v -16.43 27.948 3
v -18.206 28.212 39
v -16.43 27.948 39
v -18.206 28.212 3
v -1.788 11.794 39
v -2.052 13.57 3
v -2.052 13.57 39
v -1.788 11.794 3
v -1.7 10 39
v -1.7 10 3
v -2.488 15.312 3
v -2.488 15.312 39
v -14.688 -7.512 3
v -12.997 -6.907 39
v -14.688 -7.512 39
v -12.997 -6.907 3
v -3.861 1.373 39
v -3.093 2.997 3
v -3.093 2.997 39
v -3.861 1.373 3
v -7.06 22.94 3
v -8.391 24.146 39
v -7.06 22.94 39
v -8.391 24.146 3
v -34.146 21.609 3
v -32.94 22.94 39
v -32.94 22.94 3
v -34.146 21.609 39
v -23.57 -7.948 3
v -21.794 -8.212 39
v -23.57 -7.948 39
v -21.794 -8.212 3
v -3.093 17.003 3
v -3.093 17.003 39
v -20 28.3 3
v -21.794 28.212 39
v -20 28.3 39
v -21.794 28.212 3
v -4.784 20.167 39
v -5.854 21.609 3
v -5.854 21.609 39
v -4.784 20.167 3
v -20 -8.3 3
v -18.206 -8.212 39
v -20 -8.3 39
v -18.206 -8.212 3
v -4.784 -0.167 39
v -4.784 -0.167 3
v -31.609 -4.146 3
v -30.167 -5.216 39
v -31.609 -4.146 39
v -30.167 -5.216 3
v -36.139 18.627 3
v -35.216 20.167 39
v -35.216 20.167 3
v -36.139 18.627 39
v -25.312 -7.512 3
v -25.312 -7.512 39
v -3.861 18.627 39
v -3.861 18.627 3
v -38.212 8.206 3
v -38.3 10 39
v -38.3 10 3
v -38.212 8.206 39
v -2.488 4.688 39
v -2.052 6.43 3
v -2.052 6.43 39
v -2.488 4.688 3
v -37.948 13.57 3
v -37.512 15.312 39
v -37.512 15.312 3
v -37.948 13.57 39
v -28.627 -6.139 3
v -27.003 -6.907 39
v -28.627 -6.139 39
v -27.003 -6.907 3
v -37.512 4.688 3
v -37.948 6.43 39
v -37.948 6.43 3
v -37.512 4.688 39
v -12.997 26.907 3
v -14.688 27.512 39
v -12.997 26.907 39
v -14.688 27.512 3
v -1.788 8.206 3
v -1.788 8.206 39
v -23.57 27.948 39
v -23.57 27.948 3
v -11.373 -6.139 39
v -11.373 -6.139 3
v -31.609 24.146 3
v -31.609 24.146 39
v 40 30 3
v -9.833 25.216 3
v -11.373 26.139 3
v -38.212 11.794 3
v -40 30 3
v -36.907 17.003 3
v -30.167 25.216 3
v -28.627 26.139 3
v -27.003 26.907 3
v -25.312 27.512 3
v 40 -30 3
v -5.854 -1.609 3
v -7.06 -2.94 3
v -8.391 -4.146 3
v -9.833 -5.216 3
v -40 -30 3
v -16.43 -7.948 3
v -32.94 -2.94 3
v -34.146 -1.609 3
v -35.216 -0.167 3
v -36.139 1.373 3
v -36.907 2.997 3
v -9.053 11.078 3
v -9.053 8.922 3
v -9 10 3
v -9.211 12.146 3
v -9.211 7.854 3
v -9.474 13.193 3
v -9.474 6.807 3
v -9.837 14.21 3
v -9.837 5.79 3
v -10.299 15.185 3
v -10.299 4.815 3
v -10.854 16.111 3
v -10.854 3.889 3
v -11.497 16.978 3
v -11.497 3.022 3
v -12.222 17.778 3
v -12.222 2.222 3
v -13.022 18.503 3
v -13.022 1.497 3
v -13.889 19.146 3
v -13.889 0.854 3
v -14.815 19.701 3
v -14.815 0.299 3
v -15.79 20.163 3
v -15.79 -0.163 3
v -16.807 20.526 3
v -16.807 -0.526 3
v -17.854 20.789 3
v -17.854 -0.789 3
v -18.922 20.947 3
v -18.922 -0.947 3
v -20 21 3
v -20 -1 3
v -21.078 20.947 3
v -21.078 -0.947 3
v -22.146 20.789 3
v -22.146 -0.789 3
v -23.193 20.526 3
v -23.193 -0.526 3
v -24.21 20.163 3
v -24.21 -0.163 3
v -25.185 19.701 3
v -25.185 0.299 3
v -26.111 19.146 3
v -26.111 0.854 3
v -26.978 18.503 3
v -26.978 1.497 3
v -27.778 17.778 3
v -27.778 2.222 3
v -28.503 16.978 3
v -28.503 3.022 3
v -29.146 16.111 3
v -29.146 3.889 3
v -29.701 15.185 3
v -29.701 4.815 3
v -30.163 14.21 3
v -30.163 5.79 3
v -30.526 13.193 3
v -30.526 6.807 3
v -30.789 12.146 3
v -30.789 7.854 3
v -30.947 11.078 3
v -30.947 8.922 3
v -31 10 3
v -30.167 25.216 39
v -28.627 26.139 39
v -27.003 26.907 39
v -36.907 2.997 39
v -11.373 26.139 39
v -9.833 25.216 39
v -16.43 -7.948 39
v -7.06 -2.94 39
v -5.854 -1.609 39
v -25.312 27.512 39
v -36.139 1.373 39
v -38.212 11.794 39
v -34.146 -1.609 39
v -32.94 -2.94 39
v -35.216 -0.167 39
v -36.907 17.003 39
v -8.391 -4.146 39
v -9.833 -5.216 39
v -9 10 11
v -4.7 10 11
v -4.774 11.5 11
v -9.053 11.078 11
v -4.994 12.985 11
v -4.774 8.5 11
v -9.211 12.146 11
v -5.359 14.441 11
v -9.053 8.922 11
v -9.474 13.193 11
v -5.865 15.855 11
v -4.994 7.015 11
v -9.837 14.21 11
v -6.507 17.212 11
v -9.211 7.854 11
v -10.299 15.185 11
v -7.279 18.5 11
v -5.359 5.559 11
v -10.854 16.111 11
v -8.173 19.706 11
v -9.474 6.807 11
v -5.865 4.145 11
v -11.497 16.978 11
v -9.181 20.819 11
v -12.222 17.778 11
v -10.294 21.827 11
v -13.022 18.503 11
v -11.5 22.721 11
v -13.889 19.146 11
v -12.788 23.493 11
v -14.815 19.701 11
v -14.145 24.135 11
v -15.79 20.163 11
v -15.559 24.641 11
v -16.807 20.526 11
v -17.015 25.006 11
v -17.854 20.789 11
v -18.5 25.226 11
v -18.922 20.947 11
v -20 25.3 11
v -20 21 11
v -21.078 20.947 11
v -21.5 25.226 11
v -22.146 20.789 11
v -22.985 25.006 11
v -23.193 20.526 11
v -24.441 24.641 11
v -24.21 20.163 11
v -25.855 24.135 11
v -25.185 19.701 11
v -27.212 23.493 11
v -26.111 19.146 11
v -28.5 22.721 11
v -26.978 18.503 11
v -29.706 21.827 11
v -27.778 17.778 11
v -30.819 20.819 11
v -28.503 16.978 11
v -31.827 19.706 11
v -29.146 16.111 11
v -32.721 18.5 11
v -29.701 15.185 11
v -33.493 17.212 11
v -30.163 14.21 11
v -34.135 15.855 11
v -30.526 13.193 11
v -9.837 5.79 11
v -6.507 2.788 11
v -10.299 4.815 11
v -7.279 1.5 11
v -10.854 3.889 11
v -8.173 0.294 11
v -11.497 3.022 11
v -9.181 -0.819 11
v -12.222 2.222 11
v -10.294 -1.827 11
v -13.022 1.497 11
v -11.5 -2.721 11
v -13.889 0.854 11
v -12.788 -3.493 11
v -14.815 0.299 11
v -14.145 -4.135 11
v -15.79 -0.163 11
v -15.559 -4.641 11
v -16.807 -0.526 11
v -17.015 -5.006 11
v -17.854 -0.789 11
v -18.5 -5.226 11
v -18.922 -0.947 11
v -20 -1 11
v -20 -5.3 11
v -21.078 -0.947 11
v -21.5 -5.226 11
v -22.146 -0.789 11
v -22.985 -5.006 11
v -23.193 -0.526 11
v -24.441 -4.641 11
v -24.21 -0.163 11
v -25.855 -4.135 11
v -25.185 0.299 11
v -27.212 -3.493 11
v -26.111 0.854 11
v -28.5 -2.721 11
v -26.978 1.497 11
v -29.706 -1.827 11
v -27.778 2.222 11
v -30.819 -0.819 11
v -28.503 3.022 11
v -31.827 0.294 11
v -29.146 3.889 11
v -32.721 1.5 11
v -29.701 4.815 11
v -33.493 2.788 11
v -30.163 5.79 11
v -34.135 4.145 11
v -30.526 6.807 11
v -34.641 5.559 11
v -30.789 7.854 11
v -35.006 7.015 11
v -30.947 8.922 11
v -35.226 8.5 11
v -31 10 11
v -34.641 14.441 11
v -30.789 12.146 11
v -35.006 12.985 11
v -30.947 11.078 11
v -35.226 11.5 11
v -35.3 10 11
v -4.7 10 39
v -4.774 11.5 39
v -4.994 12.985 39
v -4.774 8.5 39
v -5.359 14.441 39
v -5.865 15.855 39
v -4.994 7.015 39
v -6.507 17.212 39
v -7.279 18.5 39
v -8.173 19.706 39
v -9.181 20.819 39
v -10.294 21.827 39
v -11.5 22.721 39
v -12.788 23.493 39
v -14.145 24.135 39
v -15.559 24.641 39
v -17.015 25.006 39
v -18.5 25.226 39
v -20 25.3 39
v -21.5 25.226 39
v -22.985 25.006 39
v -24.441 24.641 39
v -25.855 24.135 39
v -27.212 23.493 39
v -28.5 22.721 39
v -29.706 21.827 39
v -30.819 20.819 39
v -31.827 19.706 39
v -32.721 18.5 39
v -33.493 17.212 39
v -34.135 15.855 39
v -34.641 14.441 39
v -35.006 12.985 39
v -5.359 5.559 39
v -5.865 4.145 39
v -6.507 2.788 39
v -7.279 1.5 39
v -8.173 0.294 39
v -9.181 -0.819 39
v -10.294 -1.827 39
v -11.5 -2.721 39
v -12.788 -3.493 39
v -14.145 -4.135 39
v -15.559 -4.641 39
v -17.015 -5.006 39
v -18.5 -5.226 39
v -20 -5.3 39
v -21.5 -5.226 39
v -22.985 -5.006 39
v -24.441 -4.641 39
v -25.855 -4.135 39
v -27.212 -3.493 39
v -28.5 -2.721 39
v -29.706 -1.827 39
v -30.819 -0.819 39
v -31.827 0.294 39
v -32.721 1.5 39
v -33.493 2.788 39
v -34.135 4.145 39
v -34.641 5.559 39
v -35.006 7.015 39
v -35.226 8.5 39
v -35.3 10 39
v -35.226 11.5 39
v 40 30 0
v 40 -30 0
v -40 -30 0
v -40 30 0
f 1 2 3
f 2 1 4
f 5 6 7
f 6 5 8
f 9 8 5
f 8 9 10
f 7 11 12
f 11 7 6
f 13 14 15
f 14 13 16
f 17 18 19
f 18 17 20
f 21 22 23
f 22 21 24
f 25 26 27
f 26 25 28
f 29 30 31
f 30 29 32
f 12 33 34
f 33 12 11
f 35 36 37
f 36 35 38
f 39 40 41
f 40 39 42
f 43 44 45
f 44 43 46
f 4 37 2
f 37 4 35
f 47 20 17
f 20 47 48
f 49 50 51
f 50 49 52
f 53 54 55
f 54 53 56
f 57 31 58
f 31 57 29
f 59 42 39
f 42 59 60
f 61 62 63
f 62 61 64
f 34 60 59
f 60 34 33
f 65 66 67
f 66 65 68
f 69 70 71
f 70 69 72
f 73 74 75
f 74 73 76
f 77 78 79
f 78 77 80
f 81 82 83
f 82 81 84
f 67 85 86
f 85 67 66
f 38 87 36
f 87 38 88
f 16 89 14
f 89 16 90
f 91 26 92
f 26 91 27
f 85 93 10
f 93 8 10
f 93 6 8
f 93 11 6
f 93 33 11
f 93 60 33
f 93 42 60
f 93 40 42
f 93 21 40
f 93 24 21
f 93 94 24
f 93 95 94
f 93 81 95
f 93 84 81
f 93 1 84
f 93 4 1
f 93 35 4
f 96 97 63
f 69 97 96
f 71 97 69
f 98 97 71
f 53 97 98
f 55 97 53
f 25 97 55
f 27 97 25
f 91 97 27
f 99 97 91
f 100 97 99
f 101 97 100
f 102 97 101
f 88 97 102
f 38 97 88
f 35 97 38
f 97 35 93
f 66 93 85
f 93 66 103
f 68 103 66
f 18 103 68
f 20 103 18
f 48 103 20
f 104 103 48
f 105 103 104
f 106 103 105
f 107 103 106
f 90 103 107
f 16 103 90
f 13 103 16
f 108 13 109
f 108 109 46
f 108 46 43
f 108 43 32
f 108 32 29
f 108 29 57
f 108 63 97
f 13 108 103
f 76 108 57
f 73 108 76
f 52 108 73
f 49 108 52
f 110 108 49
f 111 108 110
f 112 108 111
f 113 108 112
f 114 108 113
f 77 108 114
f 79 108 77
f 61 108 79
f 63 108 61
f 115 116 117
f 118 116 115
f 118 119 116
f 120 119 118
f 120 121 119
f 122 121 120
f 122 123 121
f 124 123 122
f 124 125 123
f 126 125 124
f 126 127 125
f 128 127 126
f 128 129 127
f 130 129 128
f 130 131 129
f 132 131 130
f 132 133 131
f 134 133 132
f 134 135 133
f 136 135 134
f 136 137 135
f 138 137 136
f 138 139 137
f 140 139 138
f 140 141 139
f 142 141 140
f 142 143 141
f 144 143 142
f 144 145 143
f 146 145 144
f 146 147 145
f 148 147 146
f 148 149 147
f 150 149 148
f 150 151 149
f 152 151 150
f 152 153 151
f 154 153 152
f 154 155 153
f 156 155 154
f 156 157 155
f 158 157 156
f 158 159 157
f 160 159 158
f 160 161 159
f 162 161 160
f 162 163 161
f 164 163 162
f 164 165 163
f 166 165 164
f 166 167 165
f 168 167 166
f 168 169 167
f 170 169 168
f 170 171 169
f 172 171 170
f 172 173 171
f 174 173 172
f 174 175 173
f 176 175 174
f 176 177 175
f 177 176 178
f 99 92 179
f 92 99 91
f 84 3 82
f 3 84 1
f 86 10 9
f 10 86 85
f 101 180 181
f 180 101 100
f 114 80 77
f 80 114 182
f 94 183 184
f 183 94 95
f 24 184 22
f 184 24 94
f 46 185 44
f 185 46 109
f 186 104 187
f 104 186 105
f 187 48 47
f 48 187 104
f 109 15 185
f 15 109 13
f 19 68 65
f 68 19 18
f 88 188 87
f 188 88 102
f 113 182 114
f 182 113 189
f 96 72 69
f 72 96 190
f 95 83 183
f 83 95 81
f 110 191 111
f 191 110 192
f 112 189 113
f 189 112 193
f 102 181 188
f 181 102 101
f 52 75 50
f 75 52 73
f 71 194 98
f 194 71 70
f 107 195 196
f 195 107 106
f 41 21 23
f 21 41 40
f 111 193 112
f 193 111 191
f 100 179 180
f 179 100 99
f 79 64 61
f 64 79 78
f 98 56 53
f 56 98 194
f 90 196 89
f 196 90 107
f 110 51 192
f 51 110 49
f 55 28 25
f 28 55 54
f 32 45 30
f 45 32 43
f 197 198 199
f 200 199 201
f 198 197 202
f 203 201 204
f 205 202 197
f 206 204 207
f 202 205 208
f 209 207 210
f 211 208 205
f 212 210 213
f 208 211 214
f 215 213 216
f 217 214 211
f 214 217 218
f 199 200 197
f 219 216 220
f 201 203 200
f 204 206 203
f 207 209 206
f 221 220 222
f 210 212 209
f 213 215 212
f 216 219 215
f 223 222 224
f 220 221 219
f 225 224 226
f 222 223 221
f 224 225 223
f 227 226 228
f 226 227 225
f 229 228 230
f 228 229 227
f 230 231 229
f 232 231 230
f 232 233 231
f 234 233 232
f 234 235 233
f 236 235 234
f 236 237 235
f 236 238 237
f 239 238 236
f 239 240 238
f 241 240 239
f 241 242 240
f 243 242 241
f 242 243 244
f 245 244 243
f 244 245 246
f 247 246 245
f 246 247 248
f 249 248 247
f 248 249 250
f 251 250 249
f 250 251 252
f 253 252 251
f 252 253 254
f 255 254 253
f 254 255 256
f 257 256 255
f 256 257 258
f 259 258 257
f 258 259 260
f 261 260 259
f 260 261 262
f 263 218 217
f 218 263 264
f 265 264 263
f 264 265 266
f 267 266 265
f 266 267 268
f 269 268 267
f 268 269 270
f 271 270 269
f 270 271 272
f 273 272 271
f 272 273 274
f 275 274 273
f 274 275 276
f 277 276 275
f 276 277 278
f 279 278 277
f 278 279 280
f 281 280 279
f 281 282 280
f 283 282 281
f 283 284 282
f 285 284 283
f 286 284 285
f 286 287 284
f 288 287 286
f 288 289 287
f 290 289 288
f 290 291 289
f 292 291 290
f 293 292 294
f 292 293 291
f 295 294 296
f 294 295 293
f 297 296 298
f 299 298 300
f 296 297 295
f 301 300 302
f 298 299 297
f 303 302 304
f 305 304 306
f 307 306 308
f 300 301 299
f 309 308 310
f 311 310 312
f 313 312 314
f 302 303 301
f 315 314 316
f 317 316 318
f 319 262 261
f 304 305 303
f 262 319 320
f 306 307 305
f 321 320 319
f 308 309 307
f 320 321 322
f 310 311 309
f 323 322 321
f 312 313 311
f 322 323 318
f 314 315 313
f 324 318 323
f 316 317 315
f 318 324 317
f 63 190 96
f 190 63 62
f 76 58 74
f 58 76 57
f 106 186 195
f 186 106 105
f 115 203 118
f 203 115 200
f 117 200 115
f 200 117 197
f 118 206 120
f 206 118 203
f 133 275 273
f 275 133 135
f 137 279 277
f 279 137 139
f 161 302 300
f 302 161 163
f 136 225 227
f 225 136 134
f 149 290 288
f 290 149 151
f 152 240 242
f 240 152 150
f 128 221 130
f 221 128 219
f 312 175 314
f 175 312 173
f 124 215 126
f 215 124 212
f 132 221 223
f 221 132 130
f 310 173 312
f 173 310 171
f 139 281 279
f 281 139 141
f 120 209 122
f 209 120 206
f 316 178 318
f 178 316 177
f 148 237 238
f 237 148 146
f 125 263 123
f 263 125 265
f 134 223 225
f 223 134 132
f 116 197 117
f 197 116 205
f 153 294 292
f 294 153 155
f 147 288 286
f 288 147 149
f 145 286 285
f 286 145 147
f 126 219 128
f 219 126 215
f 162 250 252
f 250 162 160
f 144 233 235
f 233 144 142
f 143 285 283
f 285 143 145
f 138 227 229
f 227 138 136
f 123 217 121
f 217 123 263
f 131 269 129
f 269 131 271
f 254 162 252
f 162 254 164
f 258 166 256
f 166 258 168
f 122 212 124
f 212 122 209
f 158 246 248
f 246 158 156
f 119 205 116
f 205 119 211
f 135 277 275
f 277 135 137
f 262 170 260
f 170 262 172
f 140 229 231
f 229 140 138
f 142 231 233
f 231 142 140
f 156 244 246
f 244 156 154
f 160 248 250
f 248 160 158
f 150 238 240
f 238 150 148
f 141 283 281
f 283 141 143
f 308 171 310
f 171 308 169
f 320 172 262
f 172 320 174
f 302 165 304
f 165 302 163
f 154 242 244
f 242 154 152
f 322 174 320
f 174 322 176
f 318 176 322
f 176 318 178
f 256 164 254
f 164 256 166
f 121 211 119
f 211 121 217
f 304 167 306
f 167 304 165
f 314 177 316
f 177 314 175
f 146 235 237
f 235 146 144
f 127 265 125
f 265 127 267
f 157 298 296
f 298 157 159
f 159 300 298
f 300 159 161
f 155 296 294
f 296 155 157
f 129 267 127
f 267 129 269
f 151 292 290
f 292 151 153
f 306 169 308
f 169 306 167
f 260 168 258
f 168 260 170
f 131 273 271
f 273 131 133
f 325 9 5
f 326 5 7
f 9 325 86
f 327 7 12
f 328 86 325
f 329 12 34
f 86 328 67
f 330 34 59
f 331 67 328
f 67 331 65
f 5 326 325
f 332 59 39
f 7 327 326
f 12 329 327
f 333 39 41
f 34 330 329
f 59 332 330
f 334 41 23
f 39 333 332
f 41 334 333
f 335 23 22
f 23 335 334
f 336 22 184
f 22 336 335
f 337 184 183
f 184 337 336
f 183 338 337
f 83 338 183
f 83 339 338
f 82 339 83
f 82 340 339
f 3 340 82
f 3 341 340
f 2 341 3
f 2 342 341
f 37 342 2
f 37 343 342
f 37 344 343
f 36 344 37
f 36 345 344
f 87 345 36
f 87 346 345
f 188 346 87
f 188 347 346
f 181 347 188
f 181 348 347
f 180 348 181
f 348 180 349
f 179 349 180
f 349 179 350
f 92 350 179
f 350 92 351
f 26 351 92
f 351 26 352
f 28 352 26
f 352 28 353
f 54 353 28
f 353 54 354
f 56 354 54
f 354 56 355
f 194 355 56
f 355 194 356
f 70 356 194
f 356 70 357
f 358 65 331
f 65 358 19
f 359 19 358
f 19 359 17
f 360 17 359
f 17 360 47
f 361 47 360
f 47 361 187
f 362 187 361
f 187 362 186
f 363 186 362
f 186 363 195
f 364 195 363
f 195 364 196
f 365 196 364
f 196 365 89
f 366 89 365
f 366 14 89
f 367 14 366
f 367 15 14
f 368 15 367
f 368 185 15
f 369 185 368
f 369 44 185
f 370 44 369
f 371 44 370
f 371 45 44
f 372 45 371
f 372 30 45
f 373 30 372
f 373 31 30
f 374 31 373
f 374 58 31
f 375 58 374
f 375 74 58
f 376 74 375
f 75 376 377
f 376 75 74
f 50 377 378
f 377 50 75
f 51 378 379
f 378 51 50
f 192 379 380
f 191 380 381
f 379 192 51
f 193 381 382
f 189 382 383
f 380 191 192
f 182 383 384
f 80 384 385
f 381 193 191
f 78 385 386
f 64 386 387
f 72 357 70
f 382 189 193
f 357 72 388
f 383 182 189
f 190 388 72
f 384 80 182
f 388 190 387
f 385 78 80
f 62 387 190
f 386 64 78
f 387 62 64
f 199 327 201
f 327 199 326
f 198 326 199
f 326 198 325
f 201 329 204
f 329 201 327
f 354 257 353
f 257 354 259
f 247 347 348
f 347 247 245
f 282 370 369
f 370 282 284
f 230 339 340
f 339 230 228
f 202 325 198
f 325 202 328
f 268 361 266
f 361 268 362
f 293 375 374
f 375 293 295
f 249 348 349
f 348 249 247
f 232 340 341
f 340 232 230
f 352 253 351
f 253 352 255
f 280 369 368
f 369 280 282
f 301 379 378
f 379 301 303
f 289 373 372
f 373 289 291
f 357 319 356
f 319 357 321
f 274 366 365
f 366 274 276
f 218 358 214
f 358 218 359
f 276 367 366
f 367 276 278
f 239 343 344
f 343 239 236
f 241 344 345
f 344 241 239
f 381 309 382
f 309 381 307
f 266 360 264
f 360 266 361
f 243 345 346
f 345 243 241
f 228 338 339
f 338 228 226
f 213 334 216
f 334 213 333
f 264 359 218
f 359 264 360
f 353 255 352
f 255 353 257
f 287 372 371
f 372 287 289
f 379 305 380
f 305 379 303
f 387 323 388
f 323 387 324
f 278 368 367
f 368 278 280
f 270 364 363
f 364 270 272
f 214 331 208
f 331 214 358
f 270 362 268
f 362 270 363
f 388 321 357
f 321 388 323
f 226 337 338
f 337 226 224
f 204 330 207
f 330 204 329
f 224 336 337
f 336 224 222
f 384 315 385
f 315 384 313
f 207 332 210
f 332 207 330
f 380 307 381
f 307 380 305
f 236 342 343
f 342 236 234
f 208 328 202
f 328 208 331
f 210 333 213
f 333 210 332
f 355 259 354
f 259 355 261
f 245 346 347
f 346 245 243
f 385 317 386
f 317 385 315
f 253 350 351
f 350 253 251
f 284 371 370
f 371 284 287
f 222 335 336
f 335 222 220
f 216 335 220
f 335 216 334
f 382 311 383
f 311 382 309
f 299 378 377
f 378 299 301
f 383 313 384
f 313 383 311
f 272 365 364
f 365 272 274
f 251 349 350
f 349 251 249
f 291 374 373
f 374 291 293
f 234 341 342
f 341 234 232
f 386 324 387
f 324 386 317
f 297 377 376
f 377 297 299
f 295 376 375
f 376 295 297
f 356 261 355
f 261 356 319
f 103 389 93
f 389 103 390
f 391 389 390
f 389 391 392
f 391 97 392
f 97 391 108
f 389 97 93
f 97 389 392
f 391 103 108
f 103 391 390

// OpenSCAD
// Built by bench/smallmodels/features/compiler.py from a list of features.
$fn = 64;
difference() {
  union() {
    translate([0, 0, 0]) translate([-40, -30, 0]) cube([80, 60, 3]);
    translate([-20, 10, 3]) difference() { cylinder(d = 36.6, h = 8); translate([0, 0, -0.01]) cylinder(d = 22, h = 8.02); }
    translate([-20, 10, 11]) difference() { cylinder(d = 36.6, h = 28); translate([0, 0, -0.01]) cylinder(d = 30.6, h = 28.02); }
  }
  union() {
    translate([-20, 10, 35.99]) rotate([0, 0, 0]) cylinder(d = 12, h = 3.02);
  }
}
